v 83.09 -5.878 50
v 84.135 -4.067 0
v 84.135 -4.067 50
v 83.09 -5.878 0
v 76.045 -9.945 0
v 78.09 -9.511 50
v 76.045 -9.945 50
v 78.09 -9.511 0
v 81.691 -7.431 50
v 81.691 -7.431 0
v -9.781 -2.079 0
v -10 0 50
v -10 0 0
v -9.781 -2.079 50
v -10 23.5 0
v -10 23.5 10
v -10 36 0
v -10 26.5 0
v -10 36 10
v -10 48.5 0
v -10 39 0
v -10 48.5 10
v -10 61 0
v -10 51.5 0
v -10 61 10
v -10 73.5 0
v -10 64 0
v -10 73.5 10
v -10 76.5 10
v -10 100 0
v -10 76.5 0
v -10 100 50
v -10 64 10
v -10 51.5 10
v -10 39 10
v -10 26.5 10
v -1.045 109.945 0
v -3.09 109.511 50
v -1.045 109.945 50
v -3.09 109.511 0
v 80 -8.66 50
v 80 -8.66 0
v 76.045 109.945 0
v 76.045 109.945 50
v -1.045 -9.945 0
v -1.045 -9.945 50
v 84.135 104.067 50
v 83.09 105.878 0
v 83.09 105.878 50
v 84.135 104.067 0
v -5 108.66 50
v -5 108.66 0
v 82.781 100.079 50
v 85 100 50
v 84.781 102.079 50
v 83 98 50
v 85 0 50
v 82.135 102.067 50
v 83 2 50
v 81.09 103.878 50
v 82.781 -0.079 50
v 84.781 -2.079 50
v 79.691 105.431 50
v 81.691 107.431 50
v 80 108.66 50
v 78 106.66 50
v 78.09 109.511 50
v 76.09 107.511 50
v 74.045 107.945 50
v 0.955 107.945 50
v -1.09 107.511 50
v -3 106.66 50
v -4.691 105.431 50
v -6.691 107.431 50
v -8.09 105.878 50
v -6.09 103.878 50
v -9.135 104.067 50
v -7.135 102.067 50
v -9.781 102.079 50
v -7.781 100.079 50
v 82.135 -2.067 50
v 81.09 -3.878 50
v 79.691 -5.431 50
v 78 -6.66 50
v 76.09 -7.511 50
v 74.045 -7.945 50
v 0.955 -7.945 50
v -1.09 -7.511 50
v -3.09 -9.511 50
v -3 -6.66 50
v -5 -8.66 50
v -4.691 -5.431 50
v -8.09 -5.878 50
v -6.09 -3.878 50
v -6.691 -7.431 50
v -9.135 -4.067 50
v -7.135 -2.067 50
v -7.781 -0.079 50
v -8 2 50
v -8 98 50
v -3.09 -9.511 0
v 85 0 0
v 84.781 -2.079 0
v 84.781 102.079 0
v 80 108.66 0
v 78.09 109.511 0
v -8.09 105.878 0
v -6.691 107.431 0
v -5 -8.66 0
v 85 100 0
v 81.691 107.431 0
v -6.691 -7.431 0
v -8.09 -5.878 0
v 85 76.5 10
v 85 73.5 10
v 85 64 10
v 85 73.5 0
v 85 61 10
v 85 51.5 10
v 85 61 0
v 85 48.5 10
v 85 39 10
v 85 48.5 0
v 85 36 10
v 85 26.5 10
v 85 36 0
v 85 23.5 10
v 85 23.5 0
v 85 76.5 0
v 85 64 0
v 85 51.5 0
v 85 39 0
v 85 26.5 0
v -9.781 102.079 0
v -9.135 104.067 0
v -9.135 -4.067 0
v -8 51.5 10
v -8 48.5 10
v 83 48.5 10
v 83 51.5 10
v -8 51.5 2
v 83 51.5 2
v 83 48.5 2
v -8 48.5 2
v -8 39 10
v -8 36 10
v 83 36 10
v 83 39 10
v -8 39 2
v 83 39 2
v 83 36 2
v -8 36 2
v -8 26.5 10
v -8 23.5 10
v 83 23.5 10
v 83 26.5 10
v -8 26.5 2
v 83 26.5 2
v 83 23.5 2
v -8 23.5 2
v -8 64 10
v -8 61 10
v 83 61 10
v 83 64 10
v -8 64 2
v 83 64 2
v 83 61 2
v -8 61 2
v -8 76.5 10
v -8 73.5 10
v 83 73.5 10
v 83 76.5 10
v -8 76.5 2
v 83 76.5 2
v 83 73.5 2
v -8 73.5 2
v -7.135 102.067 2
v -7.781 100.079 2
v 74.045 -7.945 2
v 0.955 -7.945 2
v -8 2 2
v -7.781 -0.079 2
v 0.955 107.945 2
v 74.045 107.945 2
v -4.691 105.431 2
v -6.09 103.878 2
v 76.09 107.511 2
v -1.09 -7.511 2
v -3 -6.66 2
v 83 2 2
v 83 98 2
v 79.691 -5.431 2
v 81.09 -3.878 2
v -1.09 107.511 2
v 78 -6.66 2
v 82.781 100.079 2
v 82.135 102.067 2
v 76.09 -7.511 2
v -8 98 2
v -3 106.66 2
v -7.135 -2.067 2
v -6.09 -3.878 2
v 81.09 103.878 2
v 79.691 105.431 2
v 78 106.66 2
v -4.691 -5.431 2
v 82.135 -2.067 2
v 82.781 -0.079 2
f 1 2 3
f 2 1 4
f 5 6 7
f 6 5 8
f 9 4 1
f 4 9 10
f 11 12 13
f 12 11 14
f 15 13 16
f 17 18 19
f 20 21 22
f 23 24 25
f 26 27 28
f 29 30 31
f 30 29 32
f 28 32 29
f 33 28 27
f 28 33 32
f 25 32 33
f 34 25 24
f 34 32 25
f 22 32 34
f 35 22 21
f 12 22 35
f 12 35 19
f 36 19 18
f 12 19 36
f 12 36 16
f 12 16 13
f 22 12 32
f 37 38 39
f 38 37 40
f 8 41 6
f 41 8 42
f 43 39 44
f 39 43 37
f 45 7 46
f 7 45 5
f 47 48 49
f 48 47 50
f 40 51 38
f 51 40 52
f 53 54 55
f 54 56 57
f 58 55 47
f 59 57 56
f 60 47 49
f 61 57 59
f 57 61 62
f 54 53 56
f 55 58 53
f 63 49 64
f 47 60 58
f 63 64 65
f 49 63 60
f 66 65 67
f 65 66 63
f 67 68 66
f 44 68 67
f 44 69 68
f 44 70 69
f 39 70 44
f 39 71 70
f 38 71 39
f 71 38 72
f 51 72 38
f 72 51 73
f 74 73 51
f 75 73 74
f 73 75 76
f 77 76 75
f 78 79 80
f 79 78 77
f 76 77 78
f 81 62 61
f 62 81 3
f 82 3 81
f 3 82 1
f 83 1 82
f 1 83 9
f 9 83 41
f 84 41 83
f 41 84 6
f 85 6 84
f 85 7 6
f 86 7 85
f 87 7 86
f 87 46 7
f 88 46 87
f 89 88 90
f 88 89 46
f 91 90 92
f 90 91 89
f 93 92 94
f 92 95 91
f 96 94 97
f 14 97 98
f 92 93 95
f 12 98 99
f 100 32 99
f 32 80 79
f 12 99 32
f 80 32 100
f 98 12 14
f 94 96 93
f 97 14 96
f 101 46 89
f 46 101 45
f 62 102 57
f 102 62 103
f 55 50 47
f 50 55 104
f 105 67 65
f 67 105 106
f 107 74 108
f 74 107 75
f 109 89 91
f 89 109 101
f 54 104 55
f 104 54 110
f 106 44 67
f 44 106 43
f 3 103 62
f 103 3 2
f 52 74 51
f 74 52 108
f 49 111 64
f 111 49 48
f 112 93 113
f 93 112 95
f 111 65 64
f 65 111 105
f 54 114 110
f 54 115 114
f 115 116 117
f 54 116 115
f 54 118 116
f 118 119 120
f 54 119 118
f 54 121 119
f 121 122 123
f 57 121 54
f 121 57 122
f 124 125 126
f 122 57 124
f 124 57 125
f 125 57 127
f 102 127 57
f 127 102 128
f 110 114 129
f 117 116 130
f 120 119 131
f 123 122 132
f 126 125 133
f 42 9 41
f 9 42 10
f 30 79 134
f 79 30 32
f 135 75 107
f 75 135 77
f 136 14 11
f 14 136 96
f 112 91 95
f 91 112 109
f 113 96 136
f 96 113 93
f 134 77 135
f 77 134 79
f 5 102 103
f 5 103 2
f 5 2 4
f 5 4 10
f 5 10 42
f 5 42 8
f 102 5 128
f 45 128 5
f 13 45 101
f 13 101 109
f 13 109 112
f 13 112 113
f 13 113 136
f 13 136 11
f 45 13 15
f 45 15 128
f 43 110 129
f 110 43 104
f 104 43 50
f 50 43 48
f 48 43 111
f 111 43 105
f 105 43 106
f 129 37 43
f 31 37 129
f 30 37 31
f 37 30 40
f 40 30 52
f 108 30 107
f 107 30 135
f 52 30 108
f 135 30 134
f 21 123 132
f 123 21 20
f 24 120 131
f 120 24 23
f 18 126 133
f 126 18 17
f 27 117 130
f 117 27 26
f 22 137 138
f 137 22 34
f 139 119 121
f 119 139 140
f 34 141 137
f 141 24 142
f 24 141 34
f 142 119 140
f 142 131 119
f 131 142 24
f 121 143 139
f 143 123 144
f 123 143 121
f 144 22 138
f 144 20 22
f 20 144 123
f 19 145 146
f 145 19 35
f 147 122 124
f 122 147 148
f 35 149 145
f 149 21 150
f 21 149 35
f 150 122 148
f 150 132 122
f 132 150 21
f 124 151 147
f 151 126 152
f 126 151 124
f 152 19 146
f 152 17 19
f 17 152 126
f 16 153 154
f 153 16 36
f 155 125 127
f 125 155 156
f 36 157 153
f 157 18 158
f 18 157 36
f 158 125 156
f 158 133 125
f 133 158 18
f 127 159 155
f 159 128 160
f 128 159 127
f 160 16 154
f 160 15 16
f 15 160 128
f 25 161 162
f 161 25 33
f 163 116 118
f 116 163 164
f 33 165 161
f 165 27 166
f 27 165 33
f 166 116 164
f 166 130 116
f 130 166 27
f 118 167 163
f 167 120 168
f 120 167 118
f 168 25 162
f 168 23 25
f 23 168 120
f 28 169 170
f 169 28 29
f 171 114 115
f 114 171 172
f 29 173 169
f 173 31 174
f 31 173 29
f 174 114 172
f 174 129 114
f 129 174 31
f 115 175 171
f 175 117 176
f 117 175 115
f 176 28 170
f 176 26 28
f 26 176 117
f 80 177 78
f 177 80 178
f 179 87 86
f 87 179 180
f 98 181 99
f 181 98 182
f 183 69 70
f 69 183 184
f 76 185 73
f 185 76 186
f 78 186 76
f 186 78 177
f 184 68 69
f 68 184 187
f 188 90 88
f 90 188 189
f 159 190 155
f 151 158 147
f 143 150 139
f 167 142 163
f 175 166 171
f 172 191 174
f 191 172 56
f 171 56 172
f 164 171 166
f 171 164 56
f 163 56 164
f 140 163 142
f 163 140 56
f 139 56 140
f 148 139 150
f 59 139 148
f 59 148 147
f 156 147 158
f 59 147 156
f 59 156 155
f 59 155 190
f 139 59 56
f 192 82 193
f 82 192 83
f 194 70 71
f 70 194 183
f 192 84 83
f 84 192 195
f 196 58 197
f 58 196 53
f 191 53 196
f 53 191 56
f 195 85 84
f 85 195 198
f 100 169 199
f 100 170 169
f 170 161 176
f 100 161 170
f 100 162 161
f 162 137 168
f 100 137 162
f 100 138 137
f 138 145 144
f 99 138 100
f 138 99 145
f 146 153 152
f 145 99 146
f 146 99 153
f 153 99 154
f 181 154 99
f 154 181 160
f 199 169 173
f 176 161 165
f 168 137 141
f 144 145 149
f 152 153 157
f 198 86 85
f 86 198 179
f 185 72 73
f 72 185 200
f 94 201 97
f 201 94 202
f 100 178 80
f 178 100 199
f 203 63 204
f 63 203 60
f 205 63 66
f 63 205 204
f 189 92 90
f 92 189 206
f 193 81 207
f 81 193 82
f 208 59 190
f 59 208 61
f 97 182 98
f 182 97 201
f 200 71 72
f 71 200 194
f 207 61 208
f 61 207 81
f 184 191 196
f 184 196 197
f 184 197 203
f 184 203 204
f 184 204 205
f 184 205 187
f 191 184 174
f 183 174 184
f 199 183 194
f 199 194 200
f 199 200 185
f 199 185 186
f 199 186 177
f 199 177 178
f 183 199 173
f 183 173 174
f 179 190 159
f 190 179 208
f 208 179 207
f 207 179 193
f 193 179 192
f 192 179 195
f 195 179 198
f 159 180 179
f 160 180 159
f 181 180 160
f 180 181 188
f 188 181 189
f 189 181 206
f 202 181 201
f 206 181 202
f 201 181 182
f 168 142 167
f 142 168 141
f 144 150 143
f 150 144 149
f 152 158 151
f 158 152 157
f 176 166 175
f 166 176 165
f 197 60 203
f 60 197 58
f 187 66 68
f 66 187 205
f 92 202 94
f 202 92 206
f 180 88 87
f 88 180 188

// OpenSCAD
width = 75;
depth = 100;
height = 50;
wallThickness = 2;

difference() {
    hull() {
        cylinder(r=10, h=height);
        translate([width, 0, 0]) cylinder(r=10, h=height);
        translate([width,depth,0]) cylinder(r=10, h=height);
        translate([0,depth,0]) cylinder(r=10, h=height);
    }

    translate([-10,depth/2 - 1.5,0]) cube([depth+ 20,3,10]);   
    translate([-10,depth/2 - 14,0]) cube([depth+ 20,3,10]);   
    translate([-10,depth/2 - 26.5,0]) cube([depth+ 20,3,10]);   

    translate([-10,depth/2 + 11, 0]) cube([depth+ 20,3,10]);   
    translate([-10,depth/2 + 23.5, 0]) cube([depth+ 20,3,10]);  

    hull() {
        translate([wallThickness,wallThickness,wallThickness]) cylinder(r=10, h=height);
        translate([width-wallThickness, wallThickness, wallThickness]) cylinder(r=10, h=height);
        translate([width-wallThickness,depth-wallThickness,wallThickness]) cylinder(r=10, h=height);
        translate([wallThickness,depth-wallThickness,wallThickness]) cylinder(r=10, h=height);
    }


}
